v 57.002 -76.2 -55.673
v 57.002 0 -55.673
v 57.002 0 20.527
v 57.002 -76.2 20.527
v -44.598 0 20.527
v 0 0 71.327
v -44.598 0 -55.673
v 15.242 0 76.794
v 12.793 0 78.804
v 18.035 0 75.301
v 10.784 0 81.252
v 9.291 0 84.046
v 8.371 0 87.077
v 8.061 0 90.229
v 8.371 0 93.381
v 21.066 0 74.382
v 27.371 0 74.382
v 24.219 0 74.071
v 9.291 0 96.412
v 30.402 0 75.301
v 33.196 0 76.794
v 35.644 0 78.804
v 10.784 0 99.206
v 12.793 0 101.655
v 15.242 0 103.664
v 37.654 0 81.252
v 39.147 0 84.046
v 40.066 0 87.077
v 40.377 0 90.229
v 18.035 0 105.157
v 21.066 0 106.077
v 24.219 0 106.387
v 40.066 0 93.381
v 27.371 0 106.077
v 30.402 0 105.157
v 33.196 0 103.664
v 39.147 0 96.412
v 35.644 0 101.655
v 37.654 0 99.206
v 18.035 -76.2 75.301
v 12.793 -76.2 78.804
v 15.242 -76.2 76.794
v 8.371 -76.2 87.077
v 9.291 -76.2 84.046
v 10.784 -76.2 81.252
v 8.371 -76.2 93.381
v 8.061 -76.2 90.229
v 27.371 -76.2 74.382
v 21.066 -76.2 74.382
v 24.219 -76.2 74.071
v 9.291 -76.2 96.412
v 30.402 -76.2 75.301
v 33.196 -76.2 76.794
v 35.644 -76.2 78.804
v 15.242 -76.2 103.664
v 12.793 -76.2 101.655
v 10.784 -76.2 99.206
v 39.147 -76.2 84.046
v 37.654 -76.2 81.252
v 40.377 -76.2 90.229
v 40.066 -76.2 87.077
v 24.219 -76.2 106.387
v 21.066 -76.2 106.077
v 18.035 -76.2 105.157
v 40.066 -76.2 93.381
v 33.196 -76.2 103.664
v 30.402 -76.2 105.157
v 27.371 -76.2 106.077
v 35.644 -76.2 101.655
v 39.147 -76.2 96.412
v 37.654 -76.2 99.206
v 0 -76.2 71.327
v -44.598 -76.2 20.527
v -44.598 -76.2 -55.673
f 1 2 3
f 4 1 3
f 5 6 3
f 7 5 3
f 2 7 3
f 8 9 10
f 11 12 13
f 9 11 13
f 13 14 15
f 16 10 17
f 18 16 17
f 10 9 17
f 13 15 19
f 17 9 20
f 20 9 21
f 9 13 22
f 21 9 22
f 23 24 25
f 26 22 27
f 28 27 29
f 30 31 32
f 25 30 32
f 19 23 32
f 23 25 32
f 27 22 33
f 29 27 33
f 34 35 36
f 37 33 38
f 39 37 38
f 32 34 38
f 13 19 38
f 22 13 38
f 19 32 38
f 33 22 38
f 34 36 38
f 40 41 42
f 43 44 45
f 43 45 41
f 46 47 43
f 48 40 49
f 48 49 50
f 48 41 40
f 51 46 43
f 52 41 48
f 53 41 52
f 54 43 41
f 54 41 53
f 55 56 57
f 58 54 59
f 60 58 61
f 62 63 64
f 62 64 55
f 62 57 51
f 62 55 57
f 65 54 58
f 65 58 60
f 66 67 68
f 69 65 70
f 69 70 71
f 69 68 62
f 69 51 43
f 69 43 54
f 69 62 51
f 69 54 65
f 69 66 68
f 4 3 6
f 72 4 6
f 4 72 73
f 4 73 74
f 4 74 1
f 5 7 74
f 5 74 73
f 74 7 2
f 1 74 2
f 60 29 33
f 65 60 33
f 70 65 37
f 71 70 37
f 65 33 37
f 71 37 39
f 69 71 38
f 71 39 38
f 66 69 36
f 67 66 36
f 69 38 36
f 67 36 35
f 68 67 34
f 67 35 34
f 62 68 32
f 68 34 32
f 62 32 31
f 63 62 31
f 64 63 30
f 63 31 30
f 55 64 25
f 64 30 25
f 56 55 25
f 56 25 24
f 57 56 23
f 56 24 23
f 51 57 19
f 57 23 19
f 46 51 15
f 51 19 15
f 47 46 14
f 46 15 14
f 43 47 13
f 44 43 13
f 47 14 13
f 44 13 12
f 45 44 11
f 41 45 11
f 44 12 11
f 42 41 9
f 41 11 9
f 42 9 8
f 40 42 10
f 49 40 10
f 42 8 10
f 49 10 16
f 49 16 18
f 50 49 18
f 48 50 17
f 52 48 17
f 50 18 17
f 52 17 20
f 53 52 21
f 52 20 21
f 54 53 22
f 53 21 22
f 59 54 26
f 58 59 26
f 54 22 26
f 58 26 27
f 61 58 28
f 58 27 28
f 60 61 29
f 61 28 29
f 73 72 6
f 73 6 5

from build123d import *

# Parameters (mm, degrees)
F0_W     = 101.6
F0_H     = 76.2
F0_R     = 16.158046
F1_DEPTH = 76.2


with BuildPart() as f1:
    # F0 (on Front) → F1 (new body)
    with BuildSketch(Plane.XZ):
        Polygon((0, 71.326744), (-44.597673, 20.526744), (57.002327, 20.526744), align=None)
        with Locations((6.202327, -17.573256)):
            Rectangle(F0_W, F0_H)
        with Locations((24.218603, 90.229076)):
            Circle(F0_R)
    extrude(amount=F1_DEPTH)


solid = f1.part
